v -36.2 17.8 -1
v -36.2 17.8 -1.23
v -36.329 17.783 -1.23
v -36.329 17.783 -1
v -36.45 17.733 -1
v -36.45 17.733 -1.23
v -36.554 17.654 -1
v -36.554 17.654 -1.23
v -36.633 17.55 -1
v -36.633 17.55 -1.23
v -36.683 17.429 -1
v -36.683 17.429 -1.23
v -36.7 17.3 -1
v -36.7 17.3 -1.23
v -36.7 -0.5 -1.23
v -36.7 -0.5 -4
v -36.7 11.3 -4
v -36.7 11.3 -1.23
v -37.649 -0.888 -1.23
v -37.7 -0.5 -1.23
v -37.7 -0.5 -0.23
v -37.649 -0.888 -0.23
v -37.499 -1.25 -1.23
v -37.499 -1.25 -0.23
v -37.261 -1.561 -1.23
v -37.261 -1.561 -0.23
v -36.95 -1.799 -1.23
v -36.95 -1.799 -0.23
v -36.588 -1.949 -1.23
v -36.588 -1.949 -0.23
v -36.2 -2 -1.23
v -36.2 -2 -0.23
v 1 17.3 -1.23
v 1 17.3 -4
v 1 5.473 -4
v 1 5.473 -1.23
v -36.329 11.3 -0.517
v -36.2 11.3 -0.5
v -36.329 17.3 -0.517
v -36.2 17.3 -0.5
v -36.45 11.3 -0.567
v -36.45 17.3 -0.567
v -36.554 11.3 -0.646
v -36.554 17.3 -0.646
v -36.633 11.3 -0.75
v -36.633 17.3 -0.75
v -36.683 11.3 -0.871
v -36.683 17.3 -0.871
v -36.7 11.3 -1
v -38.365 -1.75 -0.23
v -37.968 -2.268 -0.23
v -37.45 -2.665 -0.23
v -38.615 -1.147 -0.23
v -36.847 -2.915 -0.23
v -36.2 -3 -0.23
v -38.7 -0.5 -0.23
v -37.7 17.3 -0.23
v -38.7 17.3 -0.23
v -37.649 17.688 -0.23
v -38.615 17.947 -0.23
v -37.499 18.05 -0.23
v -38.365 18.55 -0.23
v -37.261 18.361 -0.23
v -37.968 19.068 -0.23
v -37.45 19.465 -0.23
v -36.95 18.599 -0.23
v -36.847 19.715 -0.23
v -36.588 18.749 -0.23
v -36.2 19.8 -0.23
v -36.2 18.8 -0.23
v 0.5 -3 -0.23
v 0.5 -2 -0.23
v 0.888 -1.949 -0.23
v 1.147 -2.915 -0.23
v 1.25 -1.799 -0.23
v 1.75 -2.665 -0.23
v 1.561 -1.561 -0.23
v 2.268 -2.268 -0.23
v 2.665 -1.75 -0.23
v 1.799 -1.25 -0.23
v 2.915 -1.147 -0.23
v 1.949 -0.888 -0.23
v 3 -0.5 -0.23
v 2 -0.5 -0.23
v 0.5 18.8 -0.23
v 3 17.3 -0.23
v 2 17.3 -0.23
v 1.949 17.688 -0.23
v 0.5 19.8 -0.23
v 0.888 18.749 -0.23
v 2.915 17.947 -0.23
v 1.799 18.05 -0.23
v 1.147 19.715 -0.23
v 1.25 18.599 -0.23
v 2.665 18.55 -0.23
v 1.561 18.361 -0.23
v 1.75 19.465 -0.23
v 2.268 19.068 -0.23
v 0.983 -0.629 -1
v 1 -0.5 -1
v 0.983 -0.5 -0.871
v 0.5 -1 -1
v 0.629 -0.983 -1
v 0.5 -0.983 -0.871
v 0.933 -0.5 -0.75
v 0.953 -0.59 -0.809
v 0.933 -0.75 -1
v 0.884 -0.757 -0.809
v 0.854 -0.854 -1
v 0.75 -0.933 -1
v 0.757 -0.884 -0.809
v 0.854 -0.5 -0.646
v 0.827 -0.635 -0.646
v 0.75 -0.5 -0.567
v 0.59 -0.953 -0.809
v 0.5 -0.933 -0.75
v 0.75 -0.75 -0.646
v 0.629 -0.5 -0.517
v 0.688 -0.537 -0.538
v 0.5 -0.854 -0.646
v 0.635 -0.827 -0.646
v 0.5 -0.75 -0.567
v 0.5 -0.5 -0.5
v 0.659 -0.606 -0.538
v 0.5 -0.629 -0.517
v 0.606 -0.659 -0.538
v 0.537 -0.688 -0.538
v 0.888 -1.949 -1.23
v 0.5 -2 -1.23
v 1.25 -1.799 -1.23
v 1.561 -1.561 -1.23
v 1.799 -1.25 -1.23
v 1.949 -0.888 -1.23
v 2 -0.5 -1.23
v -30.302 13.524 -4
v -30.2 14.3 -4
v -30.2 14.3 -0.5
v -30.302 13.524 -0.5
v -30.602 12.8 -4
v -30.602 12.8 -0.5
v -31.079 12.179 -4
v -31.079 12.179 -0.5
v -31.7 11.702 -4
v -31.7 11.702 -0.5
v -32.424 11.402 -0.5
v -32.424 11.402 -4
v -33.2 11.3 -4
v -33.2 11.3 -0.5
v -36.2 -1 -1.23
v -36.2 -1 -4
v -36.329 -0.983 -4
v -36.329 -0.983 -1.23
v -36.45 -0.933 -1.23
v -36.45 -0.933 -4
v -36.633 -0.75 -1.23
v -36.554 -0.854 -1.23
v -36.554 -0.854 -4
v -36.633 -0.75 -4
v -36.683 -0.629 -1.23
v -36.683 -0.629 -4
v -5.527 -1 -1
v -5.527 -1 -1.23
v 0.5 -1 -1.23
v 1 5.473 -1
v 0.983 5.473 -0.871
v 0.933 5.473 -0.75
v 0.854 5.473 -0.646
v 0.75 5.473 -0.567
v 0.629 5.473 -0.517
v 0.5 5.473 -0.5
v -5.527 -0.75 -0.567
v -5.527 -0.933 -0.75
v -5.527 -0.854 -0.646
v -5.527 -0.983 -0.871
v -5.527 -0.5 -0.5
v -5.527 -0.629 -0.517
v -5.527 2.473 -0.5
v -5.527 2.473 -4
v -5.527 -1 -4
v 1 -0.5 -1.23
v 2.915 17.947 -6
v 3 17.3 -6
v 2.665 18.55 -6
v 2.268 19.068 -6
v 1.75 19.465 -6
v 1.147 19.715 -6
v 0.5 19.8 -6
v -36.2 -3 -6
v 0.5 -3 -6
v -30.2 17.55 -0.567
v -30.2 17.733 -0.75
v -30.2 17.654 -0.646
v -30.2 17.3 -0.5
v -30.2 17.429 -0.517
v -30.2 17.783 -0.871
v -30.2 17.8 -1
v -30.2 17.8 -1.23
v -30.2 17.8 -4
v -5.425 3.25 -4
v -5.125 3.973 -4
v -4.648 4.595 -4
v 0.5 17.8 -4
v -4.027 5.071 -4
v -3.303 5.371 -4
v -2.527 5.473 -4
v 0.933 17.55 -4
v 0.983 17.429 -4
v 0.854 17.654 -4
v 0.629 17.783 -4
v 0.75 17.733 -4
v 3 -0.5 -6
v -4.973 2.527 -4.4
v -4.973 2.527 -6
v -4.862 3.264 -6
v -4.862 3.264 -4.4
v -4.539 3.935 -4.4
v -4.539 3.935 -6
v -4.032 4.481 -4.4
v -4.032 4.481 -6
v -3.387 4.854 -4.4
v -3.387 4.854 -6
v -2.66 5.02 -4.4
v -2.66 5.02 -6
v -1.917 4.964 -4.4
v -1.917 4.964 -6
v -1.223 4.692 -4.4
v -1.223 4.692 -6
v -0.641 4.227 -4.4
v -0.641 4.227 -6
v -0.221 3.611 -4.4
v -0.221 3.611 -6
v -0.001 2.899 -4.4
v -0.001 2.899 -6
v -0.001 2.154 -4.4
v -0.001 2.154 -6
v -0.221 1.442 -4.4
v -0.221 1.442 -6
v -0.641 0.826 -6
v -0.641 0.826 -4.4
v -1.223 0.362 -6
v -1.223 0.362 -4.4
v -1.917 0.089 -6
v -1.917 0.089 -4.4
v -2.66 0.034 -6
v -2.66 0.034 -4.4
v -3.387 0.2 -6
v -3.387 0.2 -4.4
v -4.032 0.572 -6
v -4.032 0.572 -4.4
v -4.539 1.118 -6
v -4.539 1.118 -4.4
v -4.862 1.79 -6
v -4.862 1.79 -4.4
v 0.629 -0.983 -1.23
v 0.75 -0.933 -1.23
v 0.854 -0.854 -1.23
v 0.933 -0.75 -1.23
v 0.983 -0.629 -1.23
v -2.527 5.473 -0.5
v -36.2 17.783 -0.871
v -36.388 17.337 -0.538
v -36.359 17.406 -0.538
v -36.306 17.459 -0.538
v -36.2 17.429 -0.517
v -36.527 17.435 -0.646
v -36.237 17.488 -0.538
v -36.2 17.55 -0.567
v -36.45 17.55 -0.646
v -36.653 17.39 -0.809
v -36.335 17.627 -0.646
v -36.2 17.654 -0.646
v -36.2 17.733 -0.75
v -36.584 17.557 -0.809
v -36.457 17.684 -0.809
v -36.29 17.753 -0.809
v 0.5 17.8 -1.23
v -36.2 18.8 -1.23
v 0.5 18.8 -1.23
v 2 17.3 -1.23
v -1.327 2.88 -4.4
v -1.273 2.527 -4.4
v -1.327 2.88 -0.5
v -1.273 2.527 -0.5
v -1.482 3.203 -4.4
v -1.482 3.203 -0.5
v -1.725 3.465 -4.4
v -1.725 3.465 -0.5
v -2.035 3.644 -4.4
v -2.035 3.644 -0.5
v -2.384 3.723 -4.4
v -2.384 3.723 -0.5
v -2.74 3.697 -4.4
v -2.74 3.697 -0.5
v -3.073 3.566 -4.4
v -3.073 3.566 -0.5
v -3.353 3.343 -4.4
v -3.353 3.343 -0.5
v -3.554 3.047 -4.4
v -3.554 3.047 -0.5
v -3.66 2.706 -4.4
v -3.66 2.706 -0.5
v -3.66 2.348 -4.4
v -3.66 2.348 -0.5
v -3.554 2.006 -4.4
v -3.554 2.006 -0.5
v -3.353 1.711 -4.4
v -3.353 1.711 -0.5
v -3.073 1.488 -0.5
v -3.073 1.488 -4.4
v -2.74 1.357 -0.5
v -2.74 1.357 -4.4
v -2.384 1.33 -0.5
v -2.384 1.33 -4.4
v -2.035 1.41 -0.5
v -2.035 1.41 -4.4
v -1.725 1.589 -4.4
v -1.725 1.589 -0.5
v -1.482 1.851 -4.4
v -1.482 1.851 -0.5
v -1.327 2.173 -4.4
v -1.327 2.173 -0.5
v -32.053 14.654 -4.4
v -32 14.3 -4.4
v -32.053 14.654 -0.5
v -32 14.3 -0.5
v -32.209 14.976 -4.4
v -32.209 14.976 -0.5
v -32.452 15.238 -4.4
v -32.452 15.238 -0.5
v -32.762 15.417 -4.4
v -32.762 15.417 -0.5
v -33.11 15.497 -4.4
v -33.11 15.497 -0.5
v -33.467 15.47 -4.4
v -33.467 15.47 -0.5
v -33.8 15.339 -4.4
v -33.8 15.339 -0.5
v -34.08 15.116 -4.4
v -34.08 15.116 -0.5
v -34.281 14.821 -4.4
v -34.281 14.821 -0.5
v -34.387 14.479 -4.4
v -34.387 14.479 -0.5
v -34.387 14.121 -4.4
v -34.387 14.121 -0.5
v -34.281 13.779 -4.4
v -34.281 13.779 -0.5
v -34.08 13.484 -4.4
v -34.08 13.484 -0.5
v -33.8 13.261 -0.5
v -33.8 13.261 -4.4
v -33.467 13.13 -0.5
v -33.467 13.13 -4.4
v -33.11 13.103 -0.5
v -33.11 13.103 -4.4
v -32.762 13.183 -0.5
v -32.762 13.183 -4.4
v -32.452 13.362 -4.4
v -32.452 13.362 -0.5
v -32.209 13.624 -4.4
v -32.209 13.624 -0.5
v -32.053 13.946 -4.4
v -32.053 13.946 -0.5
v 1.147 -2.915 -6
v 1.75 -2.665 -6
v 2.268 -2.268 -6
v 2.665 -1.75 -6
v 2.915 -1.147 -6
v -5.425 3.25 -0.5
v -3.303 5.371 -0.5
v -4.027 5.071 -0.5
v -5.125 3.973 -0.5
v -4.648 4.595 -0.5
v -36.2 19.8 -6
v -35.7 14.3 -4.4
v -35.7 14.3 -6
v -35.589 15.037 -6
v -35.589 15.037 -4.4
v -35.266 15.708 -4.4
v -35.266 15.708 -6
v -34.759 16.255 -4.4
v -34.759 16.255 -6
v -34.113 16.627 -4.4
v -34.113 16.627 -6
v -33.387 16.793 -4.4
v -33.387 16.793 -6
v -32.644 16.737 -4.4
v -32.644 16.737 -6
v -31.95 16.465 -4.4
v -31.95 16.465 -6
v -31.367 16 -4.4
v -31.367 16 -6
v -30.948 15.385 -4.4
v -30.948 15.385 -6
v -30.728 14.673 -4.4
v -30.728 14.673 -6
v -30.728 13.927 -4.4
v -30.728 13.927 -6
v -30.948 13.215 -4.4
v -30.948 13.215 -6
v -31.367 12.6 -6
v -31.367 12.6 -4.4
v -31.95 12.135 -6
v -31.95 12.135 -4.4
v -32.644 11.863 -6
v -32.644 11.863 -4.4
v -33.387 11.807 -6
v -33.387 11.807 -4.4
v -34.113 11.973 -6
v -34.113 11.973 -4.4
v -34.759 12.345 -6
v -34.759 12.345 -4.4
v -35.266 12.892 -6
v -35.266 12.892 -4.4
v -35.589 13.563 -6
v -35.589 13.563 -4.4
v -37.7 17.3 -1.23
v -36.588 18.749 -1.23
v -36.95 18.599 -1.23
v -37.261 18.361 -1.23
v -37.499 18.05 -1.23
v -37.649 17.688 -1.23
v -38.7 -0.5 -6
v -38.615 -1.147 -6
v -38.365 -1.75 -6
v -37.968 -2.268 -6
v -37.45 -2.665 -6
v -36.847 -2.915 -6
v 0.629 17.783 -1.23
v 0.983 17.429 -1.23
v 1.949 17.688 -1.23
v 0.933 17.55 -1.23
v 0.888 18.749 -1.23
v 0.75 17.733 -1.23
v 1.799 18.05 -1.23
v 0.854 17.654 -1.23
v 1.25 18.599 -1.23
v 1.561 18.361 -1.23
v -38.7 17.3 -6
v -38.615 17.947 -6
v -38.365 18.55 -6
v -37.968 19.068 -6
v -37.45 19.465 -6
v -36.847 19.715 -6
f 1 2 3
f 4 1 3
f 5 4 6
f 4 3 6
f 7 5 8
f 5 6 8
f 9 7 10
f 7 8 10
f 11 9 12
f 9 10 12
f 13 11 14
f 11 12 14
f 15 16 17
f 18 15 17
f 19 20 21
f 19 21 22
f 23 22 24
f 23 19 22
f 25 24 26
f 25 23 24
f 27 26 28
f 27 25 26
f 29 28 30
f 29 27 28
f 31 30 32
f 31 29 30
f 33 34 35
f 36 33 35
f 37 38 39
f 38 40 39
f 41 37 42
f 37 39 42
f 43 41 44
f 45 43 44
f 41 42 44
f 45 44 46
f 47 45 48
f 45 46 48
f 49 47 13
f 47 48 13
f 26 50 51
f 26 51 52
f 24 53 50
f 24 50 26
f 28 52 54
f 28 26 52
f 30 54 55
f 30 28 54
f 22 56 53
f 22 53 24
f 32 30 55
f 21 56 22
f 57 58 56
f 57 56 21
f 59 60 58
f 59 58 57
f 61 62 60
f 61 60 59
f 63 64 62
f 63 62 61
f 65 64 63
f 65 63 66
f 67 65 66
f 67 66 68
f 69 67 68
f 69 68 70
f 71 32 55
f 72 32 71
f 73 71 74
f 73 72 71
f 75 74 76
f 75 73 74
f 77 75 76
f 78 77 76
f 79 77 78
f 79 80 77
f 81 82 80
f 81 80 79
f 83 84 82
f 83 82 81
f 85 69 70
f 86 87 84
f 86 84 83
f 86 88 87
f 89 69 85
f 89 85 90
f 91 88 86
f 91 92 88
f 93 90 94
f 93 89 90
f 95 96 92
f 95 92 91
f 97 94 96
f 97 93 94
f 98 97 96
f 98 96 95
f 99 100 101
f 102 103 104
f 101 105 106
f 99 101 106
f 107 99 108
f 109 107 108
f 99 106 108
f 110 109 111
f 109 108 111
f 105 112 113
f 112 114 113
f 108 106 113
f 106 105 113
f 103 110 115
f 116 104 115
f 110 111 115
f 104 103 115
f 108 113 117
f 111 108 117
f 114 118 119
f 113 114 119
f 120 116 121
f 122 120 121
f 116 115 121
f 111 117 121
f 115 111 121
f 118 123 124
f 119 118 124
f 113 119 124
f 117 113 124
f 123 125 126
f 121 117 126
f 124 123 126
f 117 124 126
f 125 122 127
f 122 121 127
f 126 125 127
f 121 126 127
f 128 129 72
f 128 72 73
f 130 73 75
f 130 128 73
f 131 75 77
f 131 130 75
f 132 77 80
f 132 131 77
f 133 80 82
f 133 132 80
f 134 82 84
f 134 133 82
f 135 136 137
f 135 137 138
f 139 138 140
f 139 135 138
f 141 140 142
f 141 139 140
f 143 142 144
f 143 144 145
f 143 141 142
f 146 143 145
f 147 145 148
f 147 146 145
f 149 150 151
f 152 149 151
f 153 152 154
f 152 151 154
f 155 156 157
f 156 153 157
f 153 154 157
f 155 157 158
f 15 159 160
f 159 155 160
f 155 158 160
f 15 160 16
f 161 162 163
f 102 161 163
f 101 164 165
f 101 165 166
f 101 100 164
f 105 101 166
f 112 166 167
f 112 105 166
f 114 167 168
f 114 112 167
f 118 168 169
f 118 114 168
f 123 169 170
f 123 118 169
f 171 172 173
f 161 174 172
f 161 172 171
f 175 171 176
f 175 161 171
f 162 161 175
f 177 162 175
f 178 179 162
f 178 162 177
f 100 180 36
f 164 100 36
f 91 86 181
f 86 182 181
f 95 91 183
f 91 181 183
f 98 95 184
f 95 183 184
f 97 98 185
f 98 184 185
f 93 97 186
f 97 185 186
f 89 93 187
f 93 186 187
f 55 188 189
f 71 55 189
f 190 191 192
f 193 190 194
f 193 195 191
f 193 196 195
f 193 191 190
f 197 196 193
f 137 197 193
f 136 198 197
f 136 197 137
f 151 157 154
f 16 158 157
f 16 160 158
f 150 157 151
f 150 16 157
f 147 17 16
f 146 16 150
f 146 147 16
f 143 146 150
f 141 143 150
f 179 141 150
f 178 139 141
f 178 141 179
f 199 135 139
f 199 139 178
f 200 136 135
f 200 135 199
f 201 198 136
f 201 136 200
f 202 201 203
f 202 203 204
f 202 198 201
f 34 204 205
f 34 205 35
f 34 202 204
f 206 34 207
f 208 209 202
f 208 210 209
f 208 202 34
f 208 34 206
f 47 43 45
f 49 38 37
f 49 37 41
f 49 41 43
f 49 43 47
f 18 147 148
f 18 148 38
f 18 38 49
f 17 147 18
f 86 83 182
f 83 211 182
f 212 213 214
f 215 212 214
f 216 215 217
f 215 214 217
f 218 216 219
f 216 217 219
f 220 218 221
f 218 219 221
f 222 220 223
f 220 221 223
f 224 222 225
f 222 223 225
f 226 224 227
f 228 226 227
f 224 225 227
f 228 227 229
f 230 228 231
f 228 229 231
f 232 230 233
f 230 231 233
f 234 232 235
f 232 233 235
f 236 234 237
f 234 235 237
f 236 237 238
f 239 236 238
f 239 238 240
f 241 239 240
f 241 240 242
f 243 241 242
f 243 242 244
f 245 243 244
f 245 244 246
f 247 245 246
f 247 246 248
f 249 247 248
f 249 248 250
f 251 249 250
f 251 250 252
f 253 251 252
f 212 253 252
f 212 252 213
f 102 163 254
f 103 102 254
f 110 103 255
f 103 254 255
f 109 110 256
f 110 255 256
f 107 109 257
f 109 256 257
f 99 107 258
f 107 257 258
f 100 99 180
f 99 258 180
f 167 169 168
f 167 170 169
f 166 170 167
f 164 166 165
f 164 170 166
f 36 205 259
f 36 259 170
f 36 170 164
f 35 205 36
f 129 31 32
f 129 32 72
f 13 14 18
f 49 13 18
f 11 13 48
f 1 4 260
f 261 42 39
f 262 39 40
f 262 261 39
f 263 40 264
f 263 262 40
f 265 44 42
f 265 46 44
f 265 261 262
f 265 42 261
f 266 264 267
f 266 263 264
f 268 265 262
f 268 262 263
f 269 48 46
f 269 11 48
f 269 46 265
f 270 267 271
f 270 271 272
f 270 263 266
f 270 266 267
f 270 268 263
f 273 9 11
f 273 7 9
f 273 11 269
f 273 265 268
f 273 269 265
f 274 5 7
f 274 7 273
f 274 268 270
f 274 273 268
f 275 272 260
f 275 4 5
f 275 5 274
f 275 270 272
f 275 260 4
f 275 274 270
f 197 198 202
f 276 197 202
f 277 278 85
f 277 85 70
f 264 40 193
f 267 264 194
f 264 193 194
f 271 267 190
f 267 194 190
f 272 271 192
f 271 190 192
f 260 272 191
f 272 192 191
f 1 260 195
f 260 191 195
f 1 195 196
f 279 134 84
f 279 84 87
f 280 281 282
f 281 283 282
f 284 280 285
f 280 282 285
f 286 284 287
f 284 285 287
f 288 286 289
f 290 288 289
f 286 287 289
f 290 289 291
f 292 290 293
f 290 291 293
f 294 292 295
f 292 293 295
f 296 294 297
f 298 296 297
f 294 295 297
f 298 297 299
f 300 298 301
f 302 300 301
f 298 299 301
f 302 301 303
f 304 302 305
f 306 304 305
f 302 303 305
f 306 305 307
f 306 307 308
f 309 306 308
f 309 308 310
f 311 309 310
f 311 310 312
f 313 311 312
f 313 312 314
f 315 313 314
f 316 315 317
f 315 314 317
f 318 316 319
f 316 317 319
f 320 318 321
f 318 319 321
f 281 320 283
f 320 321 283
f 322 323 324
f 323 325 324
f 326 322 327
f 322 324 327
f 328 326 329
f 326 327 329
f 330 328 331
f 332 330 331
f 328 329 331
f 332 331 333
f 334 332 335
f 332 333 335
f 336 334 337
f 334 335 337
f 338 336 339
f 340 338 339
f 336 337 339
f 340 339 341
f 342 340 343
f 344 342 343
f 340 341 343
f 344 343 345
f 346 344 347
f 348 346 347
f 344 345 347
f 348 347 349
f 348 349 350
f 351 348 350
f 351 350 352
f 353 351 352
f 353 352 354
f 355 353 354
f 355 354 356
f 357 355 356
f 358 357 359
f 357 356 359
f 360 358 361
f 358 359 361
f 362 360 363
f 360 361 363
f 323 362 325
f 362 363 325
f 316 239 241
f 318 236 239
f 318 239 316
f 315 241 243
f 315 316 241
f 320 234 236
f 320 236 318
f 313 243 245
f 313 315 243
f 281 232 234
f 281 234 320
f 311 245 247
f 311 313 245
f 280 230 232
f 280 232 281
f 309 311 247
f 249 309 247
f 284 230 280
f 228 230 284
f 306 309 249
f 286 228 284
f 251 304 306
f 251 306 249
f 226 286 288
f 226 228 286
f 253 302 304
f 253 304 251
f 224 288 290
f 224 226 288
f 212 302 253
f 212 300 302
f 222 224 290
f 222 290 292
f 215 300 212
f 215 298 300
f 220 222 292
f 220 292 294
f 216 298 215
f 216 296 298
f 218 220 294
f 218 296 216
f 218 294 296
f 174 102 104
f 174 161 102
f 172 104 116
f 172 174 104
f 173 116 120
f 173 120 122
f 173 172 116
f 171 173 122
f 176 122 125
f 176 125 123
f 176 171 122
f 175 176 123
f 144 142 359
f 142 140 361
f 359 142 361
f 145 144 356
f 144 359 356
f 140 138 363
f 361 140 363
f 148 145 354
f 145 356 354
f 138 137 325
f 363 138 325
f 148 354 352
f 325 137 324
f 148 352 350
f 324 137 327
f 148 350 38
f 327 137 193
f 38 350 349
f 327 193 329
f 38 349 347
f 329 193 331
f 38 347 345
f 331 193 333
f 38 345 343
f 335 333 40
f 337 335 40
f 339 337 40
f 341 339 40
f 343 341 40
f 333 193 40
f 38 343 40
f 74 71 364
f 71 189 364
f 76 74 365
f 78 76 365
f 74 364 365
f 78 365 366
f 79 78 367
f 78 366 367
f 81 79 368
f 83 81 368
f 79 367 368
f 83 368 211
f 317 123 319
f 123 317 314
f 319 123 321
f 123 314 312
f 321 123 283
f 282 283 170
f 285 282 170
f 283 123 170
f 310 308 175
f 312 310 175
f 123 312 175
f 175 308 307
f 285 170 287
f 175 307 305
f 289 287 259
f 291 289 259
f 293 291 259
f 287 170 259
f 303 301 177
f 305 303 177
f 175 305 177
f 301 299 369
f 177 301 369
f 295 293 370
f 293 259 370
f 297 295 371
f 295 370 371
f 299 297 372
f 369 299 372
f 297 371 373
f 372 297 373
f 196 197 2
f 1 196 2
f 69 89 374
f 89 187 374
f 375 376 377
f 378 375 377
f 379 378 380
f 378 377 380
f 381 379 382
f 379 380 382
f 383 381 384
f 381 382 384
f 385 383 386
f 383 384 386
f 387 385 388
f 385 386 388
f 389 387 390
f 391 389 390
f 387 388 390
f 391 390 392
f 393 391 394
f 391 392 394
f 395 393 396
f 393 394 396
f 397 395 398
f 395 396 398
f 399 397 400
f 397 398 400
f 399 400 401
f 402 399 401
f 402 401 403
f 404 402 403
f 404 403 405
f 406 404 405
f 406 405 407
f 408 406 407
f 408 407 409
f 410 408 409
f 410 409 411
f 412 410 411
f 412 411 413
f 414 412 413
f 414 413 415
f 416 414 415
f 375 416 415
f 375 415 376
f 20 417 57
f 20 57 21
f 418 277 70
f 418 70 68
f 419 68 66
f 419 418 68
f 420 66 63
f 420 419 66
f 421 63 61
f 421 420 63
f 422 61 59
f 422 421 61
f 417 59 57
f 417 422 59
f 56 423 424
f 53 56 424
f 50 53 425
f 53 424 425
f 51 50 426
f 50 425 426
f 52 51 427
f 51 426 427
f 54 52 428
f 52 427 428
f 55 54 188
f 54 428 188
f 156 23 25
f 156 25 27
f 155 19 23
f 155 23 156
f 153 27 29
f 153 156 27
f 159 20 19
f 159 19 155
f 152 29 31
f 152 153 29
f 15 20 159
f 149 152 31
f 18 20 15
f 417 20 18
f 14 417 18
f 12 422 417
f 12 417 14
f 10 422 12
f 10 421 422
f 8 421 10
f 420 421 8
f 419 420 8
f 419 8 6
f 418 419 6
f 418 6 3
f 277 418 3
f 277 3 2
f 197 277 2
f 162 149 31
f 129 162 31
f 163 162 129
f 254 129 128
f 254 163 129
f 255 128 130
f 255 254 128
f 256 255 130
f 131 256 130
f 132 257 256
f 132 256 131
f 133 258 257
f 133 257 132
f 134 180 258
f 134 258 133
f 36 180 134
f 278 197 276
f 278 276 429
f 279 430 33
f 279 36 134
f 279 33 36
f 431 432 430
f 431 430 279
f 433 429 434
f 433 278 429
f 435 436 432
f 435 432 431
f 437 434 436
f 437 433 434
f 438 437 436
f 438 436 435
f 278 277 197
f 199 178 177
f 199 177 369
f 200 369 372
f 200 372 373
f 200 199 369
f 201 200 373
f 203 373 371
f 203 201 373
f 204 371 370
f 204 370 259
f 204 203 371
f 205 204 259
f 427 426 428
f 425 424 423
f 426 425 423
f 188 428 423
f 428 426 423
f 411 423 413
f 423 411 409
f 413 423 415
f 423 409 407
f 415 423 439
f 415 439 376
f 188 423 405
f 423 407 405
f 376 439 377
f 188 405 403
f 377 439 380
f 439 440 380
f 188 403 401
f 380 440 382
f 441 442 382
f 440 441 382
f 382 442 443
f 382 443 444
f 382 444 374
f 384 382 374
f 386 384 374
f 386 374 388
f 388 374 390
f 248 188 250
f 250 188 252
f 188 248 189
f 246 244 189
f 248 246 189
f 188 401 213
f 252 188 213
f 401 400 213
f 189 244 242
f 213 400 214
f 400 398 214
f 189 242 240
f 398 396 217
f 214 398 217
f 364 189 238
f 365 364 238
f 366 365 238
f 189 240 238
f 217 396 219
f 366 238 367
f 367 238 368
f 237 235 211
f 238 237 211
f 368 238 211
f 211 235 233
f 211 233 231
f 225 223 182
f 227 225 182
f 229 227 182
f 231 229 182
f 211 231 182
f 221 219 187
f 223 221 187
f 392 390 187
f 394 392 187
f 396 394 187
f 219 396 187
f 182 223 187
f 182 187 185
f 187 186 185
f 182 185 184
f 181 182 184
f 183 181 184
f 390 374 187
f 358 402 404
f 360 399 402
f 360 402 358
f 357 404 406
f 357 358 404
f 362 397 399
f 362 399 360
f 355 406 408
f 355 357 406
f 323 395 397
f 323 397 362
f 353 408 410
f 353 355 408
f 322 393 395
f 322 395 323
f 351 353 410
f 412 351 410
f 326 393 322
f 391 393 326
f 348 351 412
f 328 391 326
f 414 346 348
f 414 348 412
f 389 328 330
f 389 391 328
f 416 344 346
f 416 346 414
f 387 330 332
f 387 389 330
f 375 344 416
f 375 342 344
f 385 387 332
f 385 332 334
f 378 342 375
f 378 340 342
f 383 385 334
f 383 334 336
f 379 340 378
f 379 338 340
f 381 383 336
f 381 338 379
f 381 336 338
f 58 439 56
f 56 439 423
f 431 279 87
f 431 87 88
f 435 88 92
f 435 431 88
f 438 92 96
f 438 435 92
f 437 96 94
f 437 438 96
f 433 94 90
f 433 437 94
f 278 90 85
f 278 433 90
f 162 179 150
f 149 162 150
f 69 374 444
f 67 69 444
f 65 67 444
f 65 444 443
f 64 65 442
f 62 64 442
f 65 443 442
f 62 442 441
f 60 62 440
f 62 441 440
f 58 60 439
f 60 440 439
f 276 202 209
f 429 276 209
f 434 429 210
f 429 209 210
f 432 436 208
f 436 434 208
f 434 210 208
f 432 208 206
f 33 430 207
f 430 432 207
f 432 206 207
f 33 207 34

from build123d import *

# Parameters (mm, degrees)
STOCK_PART3_1_START                              = -6
STOCK_PART3_1_DEPTH                              = 2
STOCK_PART3_1_START_2                            = -4
STOCK_PART3_1_2_DEPTH                            = 3.77
BOSS_EXTRUDE1_DEPTH                              = 3.5
CBORE_FOR_M2_PAN_HEAD_MACHINE_SCREW1_D           = 2.4
CBORE_FOR_M2_PAN_HEAD_MACHINE_SCREW1_CBORE_D     = 5
CBORE_FOR_M2_PAN_HEAD_MACHINE_SCREW1_CBORE_DEPTH = 1.6
CUT_EXTRUDE1_START                               = -1
CUT_EXTRUDE1_DEPTH                               = 1
FILLET1_R                                        = 0.5


# Read off the part's stored shape, not the designer's step: Stock-Part3-1
with BuildPart() as part:
    # Stock-Part3-1 outline → Stock-Part3-1 (new body)
    with BuildSketch(Plane.XY.offset(STOCK_PART3_1_START)):
        with BuildLine():
            Line((-36.200000763, -3), (0.5, -3))
            ThreePointArc((0.5, -3), (2.267766953, -2.267766953), (3, -0.5))
            Line((3, -0.5), (3, 17.299999237))
            ThreePointArc((3, 17.299999237), (2.267766953, 19.06776619), (0.5, 19.799999237))
            Line((0.5, 19.799999237), (-36.200000763, 19.799999237))
            ThreePointArc((-36.200000763, 19.799999237), (-37.967767716, 19.06776619), (-38.700000763, 17.299999237))
            Line((-38.700000763, 17.299999237), (-38.700000763, -0.5))
            ThreePointArc((-38.700000763, -0.5), (-37.967767716, -2.267766953), (-36.200000763, -3))
        make_face()
    extrude(amount=STOCK_PART3_1_DEPTH)

    # Stock-Part3-1 2 outline → Stock-Part3-1 2 (add)
    with BuildSketch(Plane.XY.offset(STOCK_PART3_1_START_2)):
        with BuildLine():
            Line((-36.200000763, -3), (0.5, -3))
            ThreePointArc((0.5, -3), (2.267766953, -2.267766953), (3, -0.5))
            Line((3, -0.5), (3, 17.299999237))
            ThreePointArc((3, 17.299999237), (2.267766953, 19.06776619), (0.5, 19.799999237))
            Line((0.5, 19.799999237), (-36.200000763, 19.799999237))
            ThreePointArc((-36.200000763, 19.799999237), (-37.967767716, 19.06776619), (-38.700000763, 17.299999237))
            Line((-38.700000763, 17.299999237), (-38.700000763, -0.5))
            ThreePointArc((-38.700000763, -0.5), (-37.967767716, -2.267766953), (-36.200000763, -3))
        make_face()
        with BuildLine():
            ThreePointArc((1, -0.5), (0.853553391, -0.853553391), (0.5, -1))
            Line((0.5, -1), (-36.200000763, -1))
            ThreePointArc((-36.200000763, -1), (-36.553554154, -0.853553391), (-36.700000763, -0.5))
            Line((-36.700000763, -0.5), (-36.700000763, 17.299999237))
            ThreePointArc((-36.700000763, 17.299999237), (-36.553554154, 17.653552628), (-36.200000763, 17.799999237))
            Line((-36.200000763, 17.799999237), (0.5, 17.799999237))
            ThreePointArc((0.5, 17.799999237), (0.853553391, 17.653552628), (1, 17.299999237))
            Line((1, 17.299999237), (1, -0.5))
        make_face(mode=Mode.SUBTRACT)
    extrude(amount=STOCK_PART3_1_2_DEPTH)

    # Sketch1 → Boss-Extrude1 (add)
    with BuildSketch(Plane.XY.offset(-4)):
        with BuildLine():
            Line((-33.200000683, 11.299999157), (-36.700000763, 11.299999157))
            Line((-36.700000763, 11.299999157), (-36.700000763, 17.299999237))
            ThreePointArc((-36.700000763, 17.299999237), (-36.553554154, 17.653552628), (-36.200000763, 17.799999237))
            Line((-36.200000763, 17.799999237), (-30.200000683, 17.799999237))
            Line((-30.200000683, 17.799999237), (-30.200000683, 14.299999157))
            ThreePointArc((-30.200000683, 14.299999157), (-31.078680339, 12.178678814), (-33.200000683, 11.299999157))
        make_face()
        with BuildLine():
            Line((-2.526751091, 5.473249069), (1, 5.473249069))
            Line((1, 5.473249069), (1, -0.5))
            ThreePointArc((1, -0.5), (0.853553391, -0.853553391), (0.5, -1))
            Line((0.5, -1), (-5.526751091, -1))
            Line((-5.526751091, -1), (-5.526751091, 2.473249069))
            ThreePointArc((-5.526751091, 2.473249069), (-4.648071434, 4.594569413), (-2.526751091, 5.473249069))
        make_face()
    extrude(amount=BOSS_EXTRUDE1_DEPTH)

    # CBORE for M2 Pan Head Machine Screw1 (through all)
    with Locations(Plane(origin=(0, 0, -6), x_dir=(-1, 0, 0), z_dir=(0, 0, -1))):
        with Locations((2.473250112, 2.526750908), (33.200000683, 14.299999157)):
            CounterBoreHole(CBORE_FOR_M2_PAN_HEAD_MACHINE_SCREW1_D / 2, CBORE_FOR_M2_PAN_HEAD_MACHINE_SCREW1_CBORE_D / 2, CBORE_FOR_M2_PAN_HEAD_MACHINE_SCREW1_CBORE_DEPTH)

    # Sketch4 → Cut-Extrude1 (cut)
    with BuildSketch(Plane.XY.offset(-0.23).offset(CUT_EXTRUDE1_START)):
        with BuildLine():
            Line((2, -0.5), (2, 17.299999237))
            ThreePointArc((2, 17.299999237), (1.560660172, 18.360659409), (0.5, 18.799999237))
            Line((0.5, 18.799999237), (-36.200000763, 18.799999237))
            ThreePointArc((-36.200000763, 18.799999237), (-37.260660935, 18.360659409), (-37.700000763, 17.299999237))
            Line((-37.700000763, 17.299999237), (-37.700000763, -0.5))
            ThreePointArc((-37.700000763, -0.5), (-37.260660935, -1.560660172), (-36.200000763, -2))
            Line((-36.200000763, -2), (0.5, -2))
            ThreePointArc((0.5, -2), (1.560660172, -1.560660172), (2, -0.5))
        make_face()
        with BuildLine():
            Line((1, -0.5), (1, 17.299999237))
            ThreePointArc((1, 17.299999237), (0.853553391, 17.653552628), (0.5, 17.799999237))
            Line((0.5, 17.799999237), (-36.200000763, 17.799999237))
            ThreePointArc((-36.200000763, 17.799999237), (-36.553554154, 17.653552628), (-36.700000763, 17.299999237))
            Line((-36.700000763, 17.299999237), (-36.700000763, -0.5))
            ThreePointArc((-36.700000763, -0.5), (-36.553554154, -0.853553391), (-36.200000763, -1))
            Line((-36.200000763, -1), (0.5, -1))
            ThreePointArc((0.5, -1), (0.853553391, -0.853553391), (1, -0.5))
        make_face(mode=Mode.SUBTRACT)
    extrude(amount=CUT_EXTRUDE1_DEPTH, mode=Mode.SUBTRACT)

    # Fillet1
    fillet1_edges = [part.edges().sort_by_distance(p)[0] for p in [
        (-33.200000723, 17.799999237, -0.5),
        (-36.553554154, 17.653552628, -0.5),
        (-36.700000763, 14.299999197, -0.5),
        (-2.513375545, -1, -0.5),
        (0.853553391, -0.853553391, -0.5),
        (1, 2.486624535, -0.5),
    ]]
    fillet(fillet1_edges, radius=FILLET1_R)


solid = part.part
